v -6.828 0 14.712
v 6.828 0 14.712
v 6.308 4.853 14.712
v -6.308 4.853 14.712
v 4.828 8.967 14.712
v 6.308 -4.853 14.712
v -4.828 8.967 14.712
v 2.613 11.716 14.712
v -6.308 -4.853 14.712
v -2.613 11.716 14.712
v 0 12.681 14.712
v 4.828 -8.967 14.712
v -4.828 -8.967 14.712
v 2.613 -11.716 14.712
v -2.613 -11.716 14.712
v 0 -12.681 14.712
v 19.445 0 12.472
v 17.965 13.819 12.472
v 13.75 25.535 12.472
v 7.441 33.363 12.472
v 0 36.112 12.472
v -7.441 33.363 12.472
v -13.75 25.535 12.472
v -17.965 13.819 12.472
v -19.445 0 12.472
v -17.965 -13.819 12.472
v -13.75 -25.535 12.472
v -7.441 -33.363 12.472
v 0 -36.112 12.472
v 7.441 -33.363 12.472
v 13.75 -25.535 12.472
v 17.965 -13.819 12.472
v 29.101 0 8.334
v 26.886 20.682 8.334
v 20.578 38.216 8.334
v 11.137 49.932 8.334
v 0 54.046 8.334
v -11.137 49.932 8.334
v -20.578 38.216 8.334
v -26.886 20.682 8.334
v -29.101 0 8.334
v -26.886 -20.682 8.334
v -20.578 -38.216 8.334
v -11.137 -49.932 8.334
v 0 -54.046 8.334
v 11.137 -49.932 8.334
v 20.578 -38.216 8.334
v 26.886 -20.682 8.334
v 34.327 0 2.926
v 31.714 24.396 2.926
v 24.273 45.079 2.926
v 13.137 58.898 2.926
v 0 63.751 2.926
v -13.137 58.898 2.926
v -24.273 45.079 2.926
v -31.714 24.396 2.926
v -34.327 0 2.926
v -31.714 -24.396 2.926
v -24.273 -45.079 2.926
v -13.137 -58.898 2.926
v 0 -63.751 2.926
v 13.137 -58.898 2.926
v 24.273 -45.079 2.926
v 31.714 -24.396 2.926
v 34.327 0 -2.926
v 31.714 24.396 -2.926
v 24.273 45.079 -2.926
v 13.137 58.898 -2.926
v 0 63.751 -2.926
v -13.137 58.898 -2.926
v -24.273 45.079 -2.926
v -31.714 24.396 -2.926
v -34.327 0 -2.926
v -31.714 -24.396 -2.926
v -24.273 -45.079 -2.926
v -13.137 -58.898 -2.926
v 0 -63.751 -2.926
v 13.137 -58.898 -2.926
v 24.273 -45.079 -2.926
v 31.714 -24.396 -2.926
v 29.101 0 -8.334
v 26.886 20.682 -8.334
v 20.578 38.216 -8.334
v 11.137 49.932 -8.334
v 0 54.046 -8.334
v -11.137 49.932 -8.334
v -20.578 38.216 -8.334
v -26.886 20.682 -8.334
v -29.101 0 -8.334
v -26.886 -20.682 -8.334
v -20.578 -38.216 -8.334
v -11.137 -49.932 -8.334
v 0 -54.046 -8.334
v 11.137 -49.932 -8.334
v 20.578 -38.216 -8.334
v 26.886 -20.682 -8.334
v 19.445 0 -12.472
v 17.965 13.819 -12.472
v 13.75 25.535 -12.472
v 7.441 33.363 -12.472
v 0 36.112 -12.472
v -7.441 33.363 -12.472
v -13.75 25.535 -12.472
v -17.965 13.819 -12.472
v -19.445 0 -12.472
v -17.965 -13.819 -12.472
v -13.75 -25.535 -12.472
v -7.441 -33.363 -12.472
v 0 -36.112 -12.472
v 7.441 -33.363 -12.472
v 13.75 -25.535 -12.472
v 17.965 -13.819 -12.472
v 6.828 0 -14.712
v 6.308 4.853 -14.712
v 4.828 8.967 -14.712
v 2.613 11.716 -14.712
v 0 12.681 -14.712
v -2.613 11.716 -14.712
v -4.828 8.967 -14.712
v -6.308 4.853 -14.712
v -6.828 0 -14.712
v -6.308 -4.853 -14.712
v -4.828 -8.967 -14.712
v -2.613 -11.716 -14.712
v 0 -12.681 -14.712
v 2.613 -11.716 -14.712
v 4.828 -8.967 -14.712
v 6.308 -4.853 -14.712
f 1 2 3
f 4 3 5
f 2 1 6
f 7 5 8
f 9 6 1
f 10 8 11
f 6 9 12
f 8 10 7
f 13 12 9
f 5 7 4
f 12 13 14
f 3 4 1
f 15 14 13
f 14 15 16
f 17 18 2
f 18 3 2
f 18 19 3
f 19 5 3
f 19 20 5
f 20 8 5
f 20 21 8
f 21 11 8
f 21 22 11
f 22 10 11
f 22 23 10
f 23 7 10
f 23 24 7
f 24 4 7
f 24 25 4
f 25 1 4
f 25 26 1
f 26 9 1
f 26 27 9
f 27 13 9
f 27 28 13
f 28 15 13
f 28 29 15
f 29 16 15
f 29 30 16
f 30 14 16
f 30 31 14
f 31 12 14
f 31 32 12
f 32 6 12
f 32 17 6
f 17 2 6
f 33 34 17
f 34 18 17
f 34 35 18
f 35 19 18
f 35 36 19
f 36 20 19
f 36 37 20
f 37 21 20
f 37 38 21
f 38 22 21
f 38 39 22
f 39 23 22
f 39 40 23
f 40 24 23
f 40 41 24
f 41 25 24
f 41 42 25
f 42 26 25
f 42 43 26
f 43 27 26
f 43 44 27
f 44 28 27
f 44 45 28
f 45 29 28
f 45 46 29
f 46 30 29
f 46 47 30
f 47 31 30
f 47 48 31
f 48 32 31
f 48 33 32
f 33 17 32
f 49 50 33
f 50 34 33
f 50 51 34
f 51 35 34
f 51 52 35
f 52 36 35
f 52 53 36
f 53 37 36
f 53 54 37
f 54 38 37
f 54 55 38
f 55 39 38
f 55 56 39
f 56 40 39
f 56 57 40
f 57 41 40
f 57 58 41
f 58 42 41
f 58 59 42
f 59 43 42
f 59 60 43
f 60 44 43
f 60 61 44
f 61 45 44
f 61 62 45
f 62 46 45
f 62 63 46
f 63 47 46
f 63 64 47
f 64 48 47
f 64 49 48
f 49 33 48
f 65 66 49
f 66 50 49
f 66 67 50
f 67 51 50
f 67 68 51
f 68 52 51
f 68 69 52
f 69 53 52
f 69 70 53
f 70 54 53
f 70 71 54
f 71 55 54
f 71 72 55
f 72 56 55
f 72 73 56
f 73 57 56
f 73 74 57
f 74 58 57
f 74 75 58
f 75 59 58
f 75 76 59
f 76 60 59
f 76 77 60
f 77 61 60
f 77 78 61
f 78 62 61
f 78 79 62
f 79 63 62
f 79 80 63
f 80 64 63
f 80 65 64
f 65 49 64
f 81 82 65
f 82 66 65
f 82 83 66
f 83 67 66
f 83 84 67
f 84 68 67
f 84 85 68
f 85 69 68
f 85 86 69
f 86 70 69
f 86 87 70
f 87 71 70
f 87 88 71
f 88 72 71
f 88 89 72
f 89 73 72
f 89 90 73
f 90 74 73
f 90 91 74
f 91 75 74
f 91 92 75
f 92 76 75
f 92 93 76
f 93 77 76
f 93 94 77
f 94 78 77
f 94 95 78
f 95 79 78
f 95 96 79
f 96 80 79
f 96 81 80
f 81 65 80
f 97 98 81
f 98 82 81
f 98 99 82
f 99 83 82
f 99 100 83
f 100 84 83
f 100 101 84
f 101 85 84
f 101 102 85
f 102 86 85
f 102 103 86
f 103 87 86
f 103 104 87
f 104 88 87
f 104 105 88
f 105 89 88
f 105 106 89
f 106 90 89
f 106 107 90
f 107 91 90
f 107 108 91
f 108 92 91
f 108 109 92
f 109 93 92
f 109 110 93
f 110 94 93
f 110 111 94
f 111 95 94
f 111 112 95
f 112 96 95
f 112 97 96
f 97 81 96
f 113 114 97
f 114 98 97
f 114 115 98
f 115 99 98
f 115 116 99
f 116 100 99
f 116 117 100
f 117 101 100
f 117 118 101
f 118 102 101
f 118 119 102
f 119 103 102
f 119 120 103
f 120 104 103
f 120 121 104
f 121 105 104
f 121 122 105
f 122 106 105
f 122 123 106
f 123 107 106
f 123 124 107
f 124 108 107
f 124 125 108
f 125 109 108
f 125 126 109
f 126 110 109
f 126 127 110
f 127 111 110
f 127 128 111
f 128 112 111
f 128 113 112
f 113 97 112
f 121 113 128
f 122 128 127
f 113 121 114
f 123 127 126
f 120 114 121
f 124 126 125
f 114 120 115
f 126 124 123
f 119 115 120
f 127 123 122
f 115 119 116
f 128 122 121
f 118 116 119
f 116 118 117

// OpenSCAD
// Generated by SolidPython 1.0.1 on 2020-07-29 00:46:47


scale(v = [7, 13, 3]) {
	sphere(r = 5);
}
/***********************************************
*********      SolidPython code:      **********
************************************************
 
# import packages: SolidPython
from solid import *
from solid.utils import *
from itertools import chain, combinations, permutations


class Resize:

    def __init__(self, scad_file):
        self.scad_file = scad_file
        #self.scad_file = import_scad(scad_file)
        # cone/cylinder param:
        self.r1 = 0
        self.r2 = 0
        self.h = 0
        # rectangular prism param:
        self.w = 0
        self.l = 0
        # ellipse param:
        self.r = 0

    # import OpenScad code (file name corresponds to shape)


    # classify shape + parameters
    def assign(self, param1, param2, param3):
        if self.scad_file == 'cone.scad':
            self.r1 = param1
            self.r2 = param2
            self.h = param3
        elif self.scad_file == 'cylinder.scad':
            self.r1 = param1
            self.r2 = param2
            self.h = param3
        elif self.scad_file == 'rectangularPrism.scad':
            self.h = param1
            self.l = param2
            self.w = param3
        else:
            self.r = param1
            self.h = param2

    # resize parameters
    def iterate(self):
        x = range(3, 20, 2)
        i = 1
        if self.scad_file == 'cone.scad':
            tempList = list(permutations(x, 2))
            for temp in tempList:
                param1 = temp[0]
                param2 = temp[1]
                filepath = 'produced_scad_files/' + 'cone' + str(param1) + '_' + str(param2) + '_' + '.scad'
                scad_render_to_file(cylinder(h=param1, r1=param2, r2=0), filepath)

        elif self.scad_file == 'cylinder.scad':
            tempList = list(permutations(x, 3))
            for temp in tempList:
                param1 = temp[0]
                param2 = temp[1]
                filepath = 'produced_scad_files/' + 'cylinder' + str(param1) + '_' + str(param2) + '_' + '.scad'
                scad_render_to_file(cylinder(h=param1, r1=param2, r2=param2), filepath)

        elif self.scad_file == 'rectangularPrism.scad':
            tempList = list(permutations(x, 3))
            for temp in tempList:
                param1 = temp[0]
                param2 = temp[1]
                param3 = temp[2]
                filepath = 'produced_scad_files/' + 'rectangularPrism' + str(param1) + '_' + str(param2) + '_' + str(
                    param3) + '.scad'
                scad_render_to_file(cube(size=(param1, param2, param3)), filepath)

        elif self.scad_file == 'ellipse.scad':
            tempList = list(permutations(x, 4))
            for temp in tempList:
                param1 = temp[0]
                param2 = temp[1]
                param3 = temp[2]
                param4 = temp[3]
                filepath = 'produced_scad_files/' + 'ellipse' + str(param1) + '_' + str(param2) + '_' + str(param3) + '_' + str(param4) + '.scad'
                scad_render_to_file(scale([param1, param2, param3])(sphere(r=param4)), filepath)

    def render_to_scadfile(self):
        scad_render_to_file(scad, 'example.scad') 
 
************************************************/
